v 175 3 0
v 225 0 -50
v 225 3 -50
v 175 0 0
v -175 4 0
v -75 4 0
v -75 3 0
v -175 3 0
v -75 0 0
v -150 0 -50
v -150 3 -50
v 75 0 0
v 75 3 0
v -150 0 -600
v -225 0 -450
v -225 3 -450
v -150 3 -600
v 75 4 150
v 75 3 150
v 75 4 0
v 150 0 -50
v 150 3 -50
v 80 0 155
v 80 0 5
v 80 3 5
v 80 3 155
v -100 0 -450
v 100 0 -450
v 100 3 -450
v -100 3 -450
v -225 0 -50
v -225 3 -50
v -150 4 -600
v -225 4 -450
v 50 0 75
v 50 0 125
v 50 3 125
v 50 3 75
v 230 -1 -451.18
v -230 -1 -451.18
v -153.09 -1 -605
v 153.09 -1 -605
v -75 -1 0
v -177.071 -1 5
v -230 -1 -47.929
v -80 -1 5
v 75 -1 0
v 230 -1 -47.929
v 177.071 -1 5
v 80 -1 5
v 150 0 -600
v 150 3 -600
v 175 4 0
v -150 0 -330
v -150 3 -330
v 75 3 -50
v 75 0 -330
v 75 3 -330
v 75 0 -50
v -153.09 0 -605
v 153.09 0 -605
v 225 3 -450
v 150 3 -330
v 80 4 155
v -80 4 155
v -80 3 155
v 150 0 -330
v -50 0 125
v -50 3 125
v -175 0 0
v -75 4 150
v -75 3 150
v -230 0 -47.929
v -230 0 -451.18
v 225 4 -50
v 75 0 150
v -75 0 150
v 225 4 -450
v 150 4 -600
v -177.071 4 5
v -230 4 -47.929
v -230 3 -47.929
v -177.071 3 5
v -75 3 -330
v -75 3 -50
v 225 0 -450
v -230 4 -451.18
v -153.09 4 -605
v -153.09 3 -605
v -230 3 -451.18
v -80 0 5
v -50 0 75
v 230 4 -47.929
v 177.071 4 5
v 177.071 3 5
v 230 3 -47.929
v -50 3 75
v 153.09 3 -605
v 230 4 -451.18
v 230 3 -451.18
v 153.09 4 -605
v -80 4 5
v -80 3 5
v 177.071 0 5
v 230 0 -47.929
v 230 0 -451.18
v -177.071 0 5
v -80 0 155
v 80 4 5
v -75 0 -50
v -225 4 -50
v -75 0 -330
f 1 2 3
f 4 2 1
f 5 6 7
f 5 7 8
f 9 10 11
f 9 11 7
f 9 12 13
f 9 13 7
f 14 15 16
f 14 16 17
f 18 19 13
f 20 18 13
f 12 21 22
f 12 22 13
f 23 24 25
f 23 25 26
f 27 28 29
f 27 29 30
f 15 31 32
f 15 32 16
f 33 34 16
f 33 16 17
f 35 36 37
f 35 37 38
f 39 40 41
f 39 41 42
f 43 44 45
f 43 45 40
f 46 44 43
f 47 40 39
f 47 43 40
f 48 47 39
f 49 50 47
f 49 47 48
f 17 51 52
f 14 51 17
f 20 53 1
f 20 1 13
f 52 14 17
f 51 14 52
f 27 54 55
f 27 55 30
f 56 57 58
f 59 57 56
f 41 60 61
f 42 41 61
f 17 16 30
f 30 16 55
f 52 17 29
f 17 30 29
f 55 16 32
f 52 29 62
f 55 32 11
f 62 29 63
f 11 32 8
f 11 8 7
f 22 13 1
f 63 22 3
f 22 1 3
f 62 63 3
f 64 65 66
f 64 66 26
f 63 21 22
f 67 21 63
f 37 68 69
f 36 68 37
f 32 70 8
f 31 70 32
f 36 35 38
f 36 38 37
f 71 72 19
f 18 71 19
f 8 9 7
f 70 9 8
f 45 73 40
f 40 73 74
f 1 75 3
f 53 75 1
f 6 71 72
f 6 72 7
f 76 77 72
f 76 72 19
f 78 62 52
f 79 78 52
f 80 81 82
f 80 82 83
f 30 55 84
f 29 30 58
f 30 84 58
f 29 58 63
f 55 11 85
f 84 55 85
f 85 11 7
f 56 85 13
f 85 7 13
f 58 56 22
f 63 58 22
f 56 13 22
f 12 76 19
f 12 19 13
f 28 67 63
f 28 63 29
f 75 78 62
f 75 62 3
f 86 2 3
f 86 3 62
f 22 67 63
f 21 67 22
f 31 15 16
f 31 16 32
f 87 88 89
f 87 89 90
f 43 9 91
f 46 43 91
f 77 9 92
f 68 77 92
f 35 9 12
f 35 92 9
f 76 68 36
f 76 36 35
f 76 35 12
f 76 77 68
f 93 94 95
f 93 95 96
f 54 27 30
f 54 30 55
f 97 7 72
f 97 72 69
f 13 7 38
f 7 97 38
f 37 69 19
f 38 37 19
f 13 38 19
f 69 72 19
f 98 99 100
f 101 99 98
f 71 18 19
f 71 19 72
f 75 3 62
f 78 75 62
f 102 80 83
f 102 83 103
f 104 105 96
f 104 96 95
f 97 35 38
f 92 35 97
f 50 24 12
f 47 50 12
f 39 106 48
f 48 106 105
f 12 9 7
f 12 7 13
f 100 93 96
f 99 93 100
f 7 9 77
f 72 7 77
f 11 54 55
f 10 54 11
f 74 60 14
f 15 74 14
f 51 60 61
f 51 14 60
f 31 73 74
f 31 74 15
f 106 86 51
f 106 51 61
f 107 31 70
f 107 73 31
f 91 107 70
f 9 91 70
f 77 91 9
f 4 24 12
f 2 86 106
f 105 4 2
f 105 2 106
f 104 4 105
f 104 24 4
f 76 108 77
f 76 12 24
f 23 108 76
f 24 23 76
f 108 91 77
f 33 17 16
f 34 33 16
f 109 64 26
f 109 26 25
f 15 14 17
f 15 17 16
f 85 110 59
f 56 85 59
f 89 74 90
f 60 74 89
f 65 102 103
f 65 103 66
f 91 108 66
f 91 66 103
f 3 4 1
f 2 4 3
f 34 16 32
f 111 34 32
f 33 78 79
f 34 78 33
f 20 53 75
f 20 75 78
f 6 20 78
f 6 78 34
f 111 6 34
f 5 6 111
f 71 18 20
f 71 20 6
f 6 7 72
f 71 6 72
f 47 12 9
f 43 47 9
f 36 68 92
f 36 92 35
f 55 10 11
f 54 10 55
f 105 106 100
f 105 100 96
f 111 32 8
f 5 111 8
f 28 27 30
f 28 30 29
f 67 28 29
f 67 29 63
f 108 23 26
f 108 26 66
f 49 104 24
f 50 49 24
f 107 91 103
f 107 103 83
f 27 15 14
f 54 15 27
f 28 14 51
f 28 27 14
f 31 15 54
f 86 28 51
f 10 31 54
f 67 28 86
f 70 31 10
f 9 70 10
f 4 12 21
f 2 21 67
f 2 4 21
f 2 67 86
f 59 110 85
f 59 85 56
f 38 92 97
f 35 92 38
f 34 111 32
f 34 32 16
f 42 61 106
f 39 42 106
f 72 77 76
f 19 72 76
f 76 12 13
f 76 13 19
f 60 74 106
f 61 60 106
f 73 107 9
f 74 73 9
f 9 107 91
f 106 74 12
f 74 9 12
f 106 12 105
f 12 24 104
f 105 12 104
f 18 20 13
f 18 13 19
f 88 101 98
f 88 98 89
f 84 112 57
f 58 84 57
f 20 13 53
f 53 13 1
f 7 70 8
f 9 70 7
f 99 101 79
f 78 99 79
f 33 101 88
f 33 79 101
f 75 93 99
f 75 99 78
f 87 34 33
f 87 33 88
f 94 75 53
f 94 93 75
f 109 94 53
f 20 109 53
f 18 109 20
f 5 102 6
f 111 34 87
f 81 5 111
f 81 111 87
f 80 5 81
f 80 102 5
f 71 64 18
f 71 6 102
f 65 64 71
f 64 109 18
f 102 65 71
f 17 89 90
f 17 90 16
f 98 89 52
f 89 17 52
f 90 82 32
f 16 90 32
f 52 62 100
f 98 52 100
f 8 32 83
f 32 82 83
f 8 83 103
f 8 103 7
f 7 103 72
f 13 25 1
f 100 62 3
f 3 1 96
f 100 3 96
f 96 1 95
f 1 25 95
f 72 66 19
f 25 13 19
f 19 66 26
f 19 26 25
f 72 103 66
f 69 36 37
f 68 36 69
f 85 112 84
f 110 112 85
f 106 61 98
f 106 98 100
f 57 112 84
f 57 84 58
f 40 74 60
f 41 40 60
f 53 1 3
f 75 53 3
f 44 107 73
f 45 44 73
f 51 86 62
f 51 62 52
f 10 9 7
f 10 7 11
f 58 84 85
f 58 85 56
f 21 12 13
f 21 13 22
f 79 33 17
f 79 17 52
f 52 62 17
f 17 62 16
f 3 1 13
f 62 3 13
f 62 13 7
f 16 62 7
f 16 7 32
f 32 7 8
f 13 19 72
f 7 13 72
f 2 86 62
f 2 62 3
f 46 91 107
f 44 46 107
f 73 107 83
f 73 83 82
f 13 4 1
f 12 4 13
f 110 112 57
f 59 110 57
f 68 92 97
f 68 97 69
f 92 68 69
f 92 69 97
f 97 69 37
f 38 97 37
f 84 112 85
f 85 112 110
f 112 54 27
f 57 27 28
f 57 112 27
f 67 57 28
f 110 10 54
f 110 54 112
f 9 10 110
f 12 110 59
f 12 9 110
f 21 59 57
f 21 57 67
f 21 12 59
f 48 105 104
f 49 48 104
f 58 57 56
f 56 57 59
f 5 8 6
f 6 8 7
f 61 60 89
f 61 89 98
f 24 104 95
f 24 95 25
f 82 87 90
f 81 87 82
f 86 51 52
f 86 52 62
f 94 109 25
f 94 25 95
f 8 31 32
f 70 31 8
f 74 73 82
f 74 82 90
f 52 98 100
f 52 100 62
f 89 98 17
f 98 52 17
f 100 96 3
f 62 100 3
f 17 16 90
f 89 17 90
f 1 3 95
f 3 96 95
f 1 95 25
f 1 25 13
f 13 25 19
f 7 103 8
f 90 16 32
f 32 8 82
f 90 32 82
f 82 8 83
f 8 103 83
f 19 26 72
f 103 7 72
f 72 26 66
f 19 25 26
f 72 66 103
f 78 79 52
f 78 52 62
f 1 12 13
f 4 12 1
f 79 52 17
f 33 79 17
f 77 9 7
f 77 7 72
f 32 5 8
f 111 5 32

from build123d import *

# Parameters (mm, degrees)
F1_DEPTH  = 3
F2_W      = 150
F2_H      = 150
F3_DEPTH  = 3
F4_W      = 150
F4_H      = 280
F5_DEPTH  = 3
F6_W      = 150
F6_H      = 280
F7_DEPTH  = 3
F9_DEPTH  = 3
F11_DEPTH = 3
F13_DEPTH = 1
F15_DEPTH = 1
F17_DEPTH = 1


with BuildPart() as f1:
    # F0 (on Front) → F1 (new body)
    with BuildSketch(Plane.XZ):
        Polygon((50, 125), (0, 125), (-50, 125), (-50, 100), (-50, 75), (0, 75), (50, 75), (50, 100), align=None)
    extrude(amount=-F1_DEPTH)


with BuildPart() as f3:
    # F2 (on Front) → F3 (new body)
    with BuildSketch(Plane.XZ):
        with Locations((0, 75)):
            Rectangle(F2_W, F2_H)
        Polygon((-50, 125), (0, 125), (50, 125), (50, 100), (50, 75), (0, 75), (-50, 75), (-50, 100), align=None, mode=Mode.SUBTRACT)
    extrude(amount=-F3_DEPTH)


with BuildPart() as f5:
    # F4 (on Front) → F5 (new body)
    with BuildSketch(Plane.XZ):
        with Locations((0, -190)):
            Rectangle(F4_W, F4_H)
    extrude(amount=-F5_DEPTH)


with BuildPart() as f7:
    # F6 (on Front) → F7 (new body)
    with BuildSketch(Plane.XZ):
        Polygon((75, 0), (-75, 0), (-150, -50), (-150, -330), (-100, -450), (100, -450), (150, -330), (150, -50), align=None)
        with Locations((0, -190)):
            Rectangle(F6_W, F6_H, mode=Mode.SUBTRACT)
    extrude(amount=-F7_DEPTH)


with BuildPart() as f9:
    # F8 (on face) → F9 (new body)
    with BuildSketch(Plane.XZ):
        Polygon((175, 0), (75, 0), (150, -50), (150, -330), (100, -450), (-100, -450), (-150, -330), (-150, -50), (-75, 0), (-175, 0), (-225, -50), (-225, -450), (-150, -600), (150, -600), (225, -450), (225, -50), align=None)
    extrude(amount=-F9_DEPTH)


with BuildPart() as f11:
    # F10 (on face) → F11 (new body)
    with BuildSketch(Plane.XZ):
        Polygon((230, -47.928932), (177.071068, 5), (80, 5), (80, 155), (-80, 155), (-80, 5), (-177.071068, 5), (-230, -47.928932), (-230, -451.18034), (-153.09017, -605), (153.09017, -605), (230, -451.18034), align=None)
        Polygon((-75, 150), (75, 150), (75, 0), (175, 0), (225, -50), (225, -450), (150, -600), (-150, -600), (-225, -450), (-225, -50), (-175, 0), (-75, 0), align=None, mode=Mode.SUBTRACT)
    extrude(amount=-F11_DEPTH)


with BuildPart() as f13:
    # F12 (on face) → F13 (new body)
    with BuildSketch(Plane(origin=(0, 3, 0), x_dir=(-1, 0, 0), z_dir=(0, 1, 0))):
        Polygon((75, 0), (75, 150), (-75, 150), (-75, 0), (-175, 0), (-225, -50), (-225, -450), (-150, -600), (150, -600), (225, -450), (225, -50), (175, 0), align=None)
    extrude(amount=F13_DEPTH)


with BuildPart() as f15:
    # F14 (on face) → F15 (new body)
    with BuildSketch(Plane(origin=(0, 4, 0), x_dir=(-1, 0, 0), z_dir=(0, 1, 0))):
        Polygon((80, 155), (-80, 155), (-80, 5), (-177.071068, 5), (-230, -47.928932), (-230, -451.18034), (-153.09017, -605), (153.09017, -605), (230, -451.18034), (230, -47.928932), (177.071068, 5), (80, 5), align=None)
        Polygon((-75, 0), (-75, 150), (75, 150), (75, 0), (175, 0), (225, -50), (225, -450), (150, -600), (-150, -600), (-225, -450), (-225, -50), (-175, 0), align=None, mode=Mode.SUBTRACT)
    extrude(amount=-F15_DEPTH)


with BuildPart() as f17:
    # F16 (on face) → F17 (new body)
    with BuildSketch(Plane.XZ):
        Polygon((-230, -451.18034), (-153.09017, -605), (153.09017, -605), (230, -451.18034), (230, -47.928932), (177.071068, 5), (80, 5), (75, 0), (-75, 0), (-80, 5), (-177.071068, 5), (-230, -47.928932), align=None)
    extrude(amount=F17_DEPTH)


solid = Compound([f1.part, f3.part, f5.part, f7.part, f9.part, f11.part, f13.part, f15.part, f17.part])
